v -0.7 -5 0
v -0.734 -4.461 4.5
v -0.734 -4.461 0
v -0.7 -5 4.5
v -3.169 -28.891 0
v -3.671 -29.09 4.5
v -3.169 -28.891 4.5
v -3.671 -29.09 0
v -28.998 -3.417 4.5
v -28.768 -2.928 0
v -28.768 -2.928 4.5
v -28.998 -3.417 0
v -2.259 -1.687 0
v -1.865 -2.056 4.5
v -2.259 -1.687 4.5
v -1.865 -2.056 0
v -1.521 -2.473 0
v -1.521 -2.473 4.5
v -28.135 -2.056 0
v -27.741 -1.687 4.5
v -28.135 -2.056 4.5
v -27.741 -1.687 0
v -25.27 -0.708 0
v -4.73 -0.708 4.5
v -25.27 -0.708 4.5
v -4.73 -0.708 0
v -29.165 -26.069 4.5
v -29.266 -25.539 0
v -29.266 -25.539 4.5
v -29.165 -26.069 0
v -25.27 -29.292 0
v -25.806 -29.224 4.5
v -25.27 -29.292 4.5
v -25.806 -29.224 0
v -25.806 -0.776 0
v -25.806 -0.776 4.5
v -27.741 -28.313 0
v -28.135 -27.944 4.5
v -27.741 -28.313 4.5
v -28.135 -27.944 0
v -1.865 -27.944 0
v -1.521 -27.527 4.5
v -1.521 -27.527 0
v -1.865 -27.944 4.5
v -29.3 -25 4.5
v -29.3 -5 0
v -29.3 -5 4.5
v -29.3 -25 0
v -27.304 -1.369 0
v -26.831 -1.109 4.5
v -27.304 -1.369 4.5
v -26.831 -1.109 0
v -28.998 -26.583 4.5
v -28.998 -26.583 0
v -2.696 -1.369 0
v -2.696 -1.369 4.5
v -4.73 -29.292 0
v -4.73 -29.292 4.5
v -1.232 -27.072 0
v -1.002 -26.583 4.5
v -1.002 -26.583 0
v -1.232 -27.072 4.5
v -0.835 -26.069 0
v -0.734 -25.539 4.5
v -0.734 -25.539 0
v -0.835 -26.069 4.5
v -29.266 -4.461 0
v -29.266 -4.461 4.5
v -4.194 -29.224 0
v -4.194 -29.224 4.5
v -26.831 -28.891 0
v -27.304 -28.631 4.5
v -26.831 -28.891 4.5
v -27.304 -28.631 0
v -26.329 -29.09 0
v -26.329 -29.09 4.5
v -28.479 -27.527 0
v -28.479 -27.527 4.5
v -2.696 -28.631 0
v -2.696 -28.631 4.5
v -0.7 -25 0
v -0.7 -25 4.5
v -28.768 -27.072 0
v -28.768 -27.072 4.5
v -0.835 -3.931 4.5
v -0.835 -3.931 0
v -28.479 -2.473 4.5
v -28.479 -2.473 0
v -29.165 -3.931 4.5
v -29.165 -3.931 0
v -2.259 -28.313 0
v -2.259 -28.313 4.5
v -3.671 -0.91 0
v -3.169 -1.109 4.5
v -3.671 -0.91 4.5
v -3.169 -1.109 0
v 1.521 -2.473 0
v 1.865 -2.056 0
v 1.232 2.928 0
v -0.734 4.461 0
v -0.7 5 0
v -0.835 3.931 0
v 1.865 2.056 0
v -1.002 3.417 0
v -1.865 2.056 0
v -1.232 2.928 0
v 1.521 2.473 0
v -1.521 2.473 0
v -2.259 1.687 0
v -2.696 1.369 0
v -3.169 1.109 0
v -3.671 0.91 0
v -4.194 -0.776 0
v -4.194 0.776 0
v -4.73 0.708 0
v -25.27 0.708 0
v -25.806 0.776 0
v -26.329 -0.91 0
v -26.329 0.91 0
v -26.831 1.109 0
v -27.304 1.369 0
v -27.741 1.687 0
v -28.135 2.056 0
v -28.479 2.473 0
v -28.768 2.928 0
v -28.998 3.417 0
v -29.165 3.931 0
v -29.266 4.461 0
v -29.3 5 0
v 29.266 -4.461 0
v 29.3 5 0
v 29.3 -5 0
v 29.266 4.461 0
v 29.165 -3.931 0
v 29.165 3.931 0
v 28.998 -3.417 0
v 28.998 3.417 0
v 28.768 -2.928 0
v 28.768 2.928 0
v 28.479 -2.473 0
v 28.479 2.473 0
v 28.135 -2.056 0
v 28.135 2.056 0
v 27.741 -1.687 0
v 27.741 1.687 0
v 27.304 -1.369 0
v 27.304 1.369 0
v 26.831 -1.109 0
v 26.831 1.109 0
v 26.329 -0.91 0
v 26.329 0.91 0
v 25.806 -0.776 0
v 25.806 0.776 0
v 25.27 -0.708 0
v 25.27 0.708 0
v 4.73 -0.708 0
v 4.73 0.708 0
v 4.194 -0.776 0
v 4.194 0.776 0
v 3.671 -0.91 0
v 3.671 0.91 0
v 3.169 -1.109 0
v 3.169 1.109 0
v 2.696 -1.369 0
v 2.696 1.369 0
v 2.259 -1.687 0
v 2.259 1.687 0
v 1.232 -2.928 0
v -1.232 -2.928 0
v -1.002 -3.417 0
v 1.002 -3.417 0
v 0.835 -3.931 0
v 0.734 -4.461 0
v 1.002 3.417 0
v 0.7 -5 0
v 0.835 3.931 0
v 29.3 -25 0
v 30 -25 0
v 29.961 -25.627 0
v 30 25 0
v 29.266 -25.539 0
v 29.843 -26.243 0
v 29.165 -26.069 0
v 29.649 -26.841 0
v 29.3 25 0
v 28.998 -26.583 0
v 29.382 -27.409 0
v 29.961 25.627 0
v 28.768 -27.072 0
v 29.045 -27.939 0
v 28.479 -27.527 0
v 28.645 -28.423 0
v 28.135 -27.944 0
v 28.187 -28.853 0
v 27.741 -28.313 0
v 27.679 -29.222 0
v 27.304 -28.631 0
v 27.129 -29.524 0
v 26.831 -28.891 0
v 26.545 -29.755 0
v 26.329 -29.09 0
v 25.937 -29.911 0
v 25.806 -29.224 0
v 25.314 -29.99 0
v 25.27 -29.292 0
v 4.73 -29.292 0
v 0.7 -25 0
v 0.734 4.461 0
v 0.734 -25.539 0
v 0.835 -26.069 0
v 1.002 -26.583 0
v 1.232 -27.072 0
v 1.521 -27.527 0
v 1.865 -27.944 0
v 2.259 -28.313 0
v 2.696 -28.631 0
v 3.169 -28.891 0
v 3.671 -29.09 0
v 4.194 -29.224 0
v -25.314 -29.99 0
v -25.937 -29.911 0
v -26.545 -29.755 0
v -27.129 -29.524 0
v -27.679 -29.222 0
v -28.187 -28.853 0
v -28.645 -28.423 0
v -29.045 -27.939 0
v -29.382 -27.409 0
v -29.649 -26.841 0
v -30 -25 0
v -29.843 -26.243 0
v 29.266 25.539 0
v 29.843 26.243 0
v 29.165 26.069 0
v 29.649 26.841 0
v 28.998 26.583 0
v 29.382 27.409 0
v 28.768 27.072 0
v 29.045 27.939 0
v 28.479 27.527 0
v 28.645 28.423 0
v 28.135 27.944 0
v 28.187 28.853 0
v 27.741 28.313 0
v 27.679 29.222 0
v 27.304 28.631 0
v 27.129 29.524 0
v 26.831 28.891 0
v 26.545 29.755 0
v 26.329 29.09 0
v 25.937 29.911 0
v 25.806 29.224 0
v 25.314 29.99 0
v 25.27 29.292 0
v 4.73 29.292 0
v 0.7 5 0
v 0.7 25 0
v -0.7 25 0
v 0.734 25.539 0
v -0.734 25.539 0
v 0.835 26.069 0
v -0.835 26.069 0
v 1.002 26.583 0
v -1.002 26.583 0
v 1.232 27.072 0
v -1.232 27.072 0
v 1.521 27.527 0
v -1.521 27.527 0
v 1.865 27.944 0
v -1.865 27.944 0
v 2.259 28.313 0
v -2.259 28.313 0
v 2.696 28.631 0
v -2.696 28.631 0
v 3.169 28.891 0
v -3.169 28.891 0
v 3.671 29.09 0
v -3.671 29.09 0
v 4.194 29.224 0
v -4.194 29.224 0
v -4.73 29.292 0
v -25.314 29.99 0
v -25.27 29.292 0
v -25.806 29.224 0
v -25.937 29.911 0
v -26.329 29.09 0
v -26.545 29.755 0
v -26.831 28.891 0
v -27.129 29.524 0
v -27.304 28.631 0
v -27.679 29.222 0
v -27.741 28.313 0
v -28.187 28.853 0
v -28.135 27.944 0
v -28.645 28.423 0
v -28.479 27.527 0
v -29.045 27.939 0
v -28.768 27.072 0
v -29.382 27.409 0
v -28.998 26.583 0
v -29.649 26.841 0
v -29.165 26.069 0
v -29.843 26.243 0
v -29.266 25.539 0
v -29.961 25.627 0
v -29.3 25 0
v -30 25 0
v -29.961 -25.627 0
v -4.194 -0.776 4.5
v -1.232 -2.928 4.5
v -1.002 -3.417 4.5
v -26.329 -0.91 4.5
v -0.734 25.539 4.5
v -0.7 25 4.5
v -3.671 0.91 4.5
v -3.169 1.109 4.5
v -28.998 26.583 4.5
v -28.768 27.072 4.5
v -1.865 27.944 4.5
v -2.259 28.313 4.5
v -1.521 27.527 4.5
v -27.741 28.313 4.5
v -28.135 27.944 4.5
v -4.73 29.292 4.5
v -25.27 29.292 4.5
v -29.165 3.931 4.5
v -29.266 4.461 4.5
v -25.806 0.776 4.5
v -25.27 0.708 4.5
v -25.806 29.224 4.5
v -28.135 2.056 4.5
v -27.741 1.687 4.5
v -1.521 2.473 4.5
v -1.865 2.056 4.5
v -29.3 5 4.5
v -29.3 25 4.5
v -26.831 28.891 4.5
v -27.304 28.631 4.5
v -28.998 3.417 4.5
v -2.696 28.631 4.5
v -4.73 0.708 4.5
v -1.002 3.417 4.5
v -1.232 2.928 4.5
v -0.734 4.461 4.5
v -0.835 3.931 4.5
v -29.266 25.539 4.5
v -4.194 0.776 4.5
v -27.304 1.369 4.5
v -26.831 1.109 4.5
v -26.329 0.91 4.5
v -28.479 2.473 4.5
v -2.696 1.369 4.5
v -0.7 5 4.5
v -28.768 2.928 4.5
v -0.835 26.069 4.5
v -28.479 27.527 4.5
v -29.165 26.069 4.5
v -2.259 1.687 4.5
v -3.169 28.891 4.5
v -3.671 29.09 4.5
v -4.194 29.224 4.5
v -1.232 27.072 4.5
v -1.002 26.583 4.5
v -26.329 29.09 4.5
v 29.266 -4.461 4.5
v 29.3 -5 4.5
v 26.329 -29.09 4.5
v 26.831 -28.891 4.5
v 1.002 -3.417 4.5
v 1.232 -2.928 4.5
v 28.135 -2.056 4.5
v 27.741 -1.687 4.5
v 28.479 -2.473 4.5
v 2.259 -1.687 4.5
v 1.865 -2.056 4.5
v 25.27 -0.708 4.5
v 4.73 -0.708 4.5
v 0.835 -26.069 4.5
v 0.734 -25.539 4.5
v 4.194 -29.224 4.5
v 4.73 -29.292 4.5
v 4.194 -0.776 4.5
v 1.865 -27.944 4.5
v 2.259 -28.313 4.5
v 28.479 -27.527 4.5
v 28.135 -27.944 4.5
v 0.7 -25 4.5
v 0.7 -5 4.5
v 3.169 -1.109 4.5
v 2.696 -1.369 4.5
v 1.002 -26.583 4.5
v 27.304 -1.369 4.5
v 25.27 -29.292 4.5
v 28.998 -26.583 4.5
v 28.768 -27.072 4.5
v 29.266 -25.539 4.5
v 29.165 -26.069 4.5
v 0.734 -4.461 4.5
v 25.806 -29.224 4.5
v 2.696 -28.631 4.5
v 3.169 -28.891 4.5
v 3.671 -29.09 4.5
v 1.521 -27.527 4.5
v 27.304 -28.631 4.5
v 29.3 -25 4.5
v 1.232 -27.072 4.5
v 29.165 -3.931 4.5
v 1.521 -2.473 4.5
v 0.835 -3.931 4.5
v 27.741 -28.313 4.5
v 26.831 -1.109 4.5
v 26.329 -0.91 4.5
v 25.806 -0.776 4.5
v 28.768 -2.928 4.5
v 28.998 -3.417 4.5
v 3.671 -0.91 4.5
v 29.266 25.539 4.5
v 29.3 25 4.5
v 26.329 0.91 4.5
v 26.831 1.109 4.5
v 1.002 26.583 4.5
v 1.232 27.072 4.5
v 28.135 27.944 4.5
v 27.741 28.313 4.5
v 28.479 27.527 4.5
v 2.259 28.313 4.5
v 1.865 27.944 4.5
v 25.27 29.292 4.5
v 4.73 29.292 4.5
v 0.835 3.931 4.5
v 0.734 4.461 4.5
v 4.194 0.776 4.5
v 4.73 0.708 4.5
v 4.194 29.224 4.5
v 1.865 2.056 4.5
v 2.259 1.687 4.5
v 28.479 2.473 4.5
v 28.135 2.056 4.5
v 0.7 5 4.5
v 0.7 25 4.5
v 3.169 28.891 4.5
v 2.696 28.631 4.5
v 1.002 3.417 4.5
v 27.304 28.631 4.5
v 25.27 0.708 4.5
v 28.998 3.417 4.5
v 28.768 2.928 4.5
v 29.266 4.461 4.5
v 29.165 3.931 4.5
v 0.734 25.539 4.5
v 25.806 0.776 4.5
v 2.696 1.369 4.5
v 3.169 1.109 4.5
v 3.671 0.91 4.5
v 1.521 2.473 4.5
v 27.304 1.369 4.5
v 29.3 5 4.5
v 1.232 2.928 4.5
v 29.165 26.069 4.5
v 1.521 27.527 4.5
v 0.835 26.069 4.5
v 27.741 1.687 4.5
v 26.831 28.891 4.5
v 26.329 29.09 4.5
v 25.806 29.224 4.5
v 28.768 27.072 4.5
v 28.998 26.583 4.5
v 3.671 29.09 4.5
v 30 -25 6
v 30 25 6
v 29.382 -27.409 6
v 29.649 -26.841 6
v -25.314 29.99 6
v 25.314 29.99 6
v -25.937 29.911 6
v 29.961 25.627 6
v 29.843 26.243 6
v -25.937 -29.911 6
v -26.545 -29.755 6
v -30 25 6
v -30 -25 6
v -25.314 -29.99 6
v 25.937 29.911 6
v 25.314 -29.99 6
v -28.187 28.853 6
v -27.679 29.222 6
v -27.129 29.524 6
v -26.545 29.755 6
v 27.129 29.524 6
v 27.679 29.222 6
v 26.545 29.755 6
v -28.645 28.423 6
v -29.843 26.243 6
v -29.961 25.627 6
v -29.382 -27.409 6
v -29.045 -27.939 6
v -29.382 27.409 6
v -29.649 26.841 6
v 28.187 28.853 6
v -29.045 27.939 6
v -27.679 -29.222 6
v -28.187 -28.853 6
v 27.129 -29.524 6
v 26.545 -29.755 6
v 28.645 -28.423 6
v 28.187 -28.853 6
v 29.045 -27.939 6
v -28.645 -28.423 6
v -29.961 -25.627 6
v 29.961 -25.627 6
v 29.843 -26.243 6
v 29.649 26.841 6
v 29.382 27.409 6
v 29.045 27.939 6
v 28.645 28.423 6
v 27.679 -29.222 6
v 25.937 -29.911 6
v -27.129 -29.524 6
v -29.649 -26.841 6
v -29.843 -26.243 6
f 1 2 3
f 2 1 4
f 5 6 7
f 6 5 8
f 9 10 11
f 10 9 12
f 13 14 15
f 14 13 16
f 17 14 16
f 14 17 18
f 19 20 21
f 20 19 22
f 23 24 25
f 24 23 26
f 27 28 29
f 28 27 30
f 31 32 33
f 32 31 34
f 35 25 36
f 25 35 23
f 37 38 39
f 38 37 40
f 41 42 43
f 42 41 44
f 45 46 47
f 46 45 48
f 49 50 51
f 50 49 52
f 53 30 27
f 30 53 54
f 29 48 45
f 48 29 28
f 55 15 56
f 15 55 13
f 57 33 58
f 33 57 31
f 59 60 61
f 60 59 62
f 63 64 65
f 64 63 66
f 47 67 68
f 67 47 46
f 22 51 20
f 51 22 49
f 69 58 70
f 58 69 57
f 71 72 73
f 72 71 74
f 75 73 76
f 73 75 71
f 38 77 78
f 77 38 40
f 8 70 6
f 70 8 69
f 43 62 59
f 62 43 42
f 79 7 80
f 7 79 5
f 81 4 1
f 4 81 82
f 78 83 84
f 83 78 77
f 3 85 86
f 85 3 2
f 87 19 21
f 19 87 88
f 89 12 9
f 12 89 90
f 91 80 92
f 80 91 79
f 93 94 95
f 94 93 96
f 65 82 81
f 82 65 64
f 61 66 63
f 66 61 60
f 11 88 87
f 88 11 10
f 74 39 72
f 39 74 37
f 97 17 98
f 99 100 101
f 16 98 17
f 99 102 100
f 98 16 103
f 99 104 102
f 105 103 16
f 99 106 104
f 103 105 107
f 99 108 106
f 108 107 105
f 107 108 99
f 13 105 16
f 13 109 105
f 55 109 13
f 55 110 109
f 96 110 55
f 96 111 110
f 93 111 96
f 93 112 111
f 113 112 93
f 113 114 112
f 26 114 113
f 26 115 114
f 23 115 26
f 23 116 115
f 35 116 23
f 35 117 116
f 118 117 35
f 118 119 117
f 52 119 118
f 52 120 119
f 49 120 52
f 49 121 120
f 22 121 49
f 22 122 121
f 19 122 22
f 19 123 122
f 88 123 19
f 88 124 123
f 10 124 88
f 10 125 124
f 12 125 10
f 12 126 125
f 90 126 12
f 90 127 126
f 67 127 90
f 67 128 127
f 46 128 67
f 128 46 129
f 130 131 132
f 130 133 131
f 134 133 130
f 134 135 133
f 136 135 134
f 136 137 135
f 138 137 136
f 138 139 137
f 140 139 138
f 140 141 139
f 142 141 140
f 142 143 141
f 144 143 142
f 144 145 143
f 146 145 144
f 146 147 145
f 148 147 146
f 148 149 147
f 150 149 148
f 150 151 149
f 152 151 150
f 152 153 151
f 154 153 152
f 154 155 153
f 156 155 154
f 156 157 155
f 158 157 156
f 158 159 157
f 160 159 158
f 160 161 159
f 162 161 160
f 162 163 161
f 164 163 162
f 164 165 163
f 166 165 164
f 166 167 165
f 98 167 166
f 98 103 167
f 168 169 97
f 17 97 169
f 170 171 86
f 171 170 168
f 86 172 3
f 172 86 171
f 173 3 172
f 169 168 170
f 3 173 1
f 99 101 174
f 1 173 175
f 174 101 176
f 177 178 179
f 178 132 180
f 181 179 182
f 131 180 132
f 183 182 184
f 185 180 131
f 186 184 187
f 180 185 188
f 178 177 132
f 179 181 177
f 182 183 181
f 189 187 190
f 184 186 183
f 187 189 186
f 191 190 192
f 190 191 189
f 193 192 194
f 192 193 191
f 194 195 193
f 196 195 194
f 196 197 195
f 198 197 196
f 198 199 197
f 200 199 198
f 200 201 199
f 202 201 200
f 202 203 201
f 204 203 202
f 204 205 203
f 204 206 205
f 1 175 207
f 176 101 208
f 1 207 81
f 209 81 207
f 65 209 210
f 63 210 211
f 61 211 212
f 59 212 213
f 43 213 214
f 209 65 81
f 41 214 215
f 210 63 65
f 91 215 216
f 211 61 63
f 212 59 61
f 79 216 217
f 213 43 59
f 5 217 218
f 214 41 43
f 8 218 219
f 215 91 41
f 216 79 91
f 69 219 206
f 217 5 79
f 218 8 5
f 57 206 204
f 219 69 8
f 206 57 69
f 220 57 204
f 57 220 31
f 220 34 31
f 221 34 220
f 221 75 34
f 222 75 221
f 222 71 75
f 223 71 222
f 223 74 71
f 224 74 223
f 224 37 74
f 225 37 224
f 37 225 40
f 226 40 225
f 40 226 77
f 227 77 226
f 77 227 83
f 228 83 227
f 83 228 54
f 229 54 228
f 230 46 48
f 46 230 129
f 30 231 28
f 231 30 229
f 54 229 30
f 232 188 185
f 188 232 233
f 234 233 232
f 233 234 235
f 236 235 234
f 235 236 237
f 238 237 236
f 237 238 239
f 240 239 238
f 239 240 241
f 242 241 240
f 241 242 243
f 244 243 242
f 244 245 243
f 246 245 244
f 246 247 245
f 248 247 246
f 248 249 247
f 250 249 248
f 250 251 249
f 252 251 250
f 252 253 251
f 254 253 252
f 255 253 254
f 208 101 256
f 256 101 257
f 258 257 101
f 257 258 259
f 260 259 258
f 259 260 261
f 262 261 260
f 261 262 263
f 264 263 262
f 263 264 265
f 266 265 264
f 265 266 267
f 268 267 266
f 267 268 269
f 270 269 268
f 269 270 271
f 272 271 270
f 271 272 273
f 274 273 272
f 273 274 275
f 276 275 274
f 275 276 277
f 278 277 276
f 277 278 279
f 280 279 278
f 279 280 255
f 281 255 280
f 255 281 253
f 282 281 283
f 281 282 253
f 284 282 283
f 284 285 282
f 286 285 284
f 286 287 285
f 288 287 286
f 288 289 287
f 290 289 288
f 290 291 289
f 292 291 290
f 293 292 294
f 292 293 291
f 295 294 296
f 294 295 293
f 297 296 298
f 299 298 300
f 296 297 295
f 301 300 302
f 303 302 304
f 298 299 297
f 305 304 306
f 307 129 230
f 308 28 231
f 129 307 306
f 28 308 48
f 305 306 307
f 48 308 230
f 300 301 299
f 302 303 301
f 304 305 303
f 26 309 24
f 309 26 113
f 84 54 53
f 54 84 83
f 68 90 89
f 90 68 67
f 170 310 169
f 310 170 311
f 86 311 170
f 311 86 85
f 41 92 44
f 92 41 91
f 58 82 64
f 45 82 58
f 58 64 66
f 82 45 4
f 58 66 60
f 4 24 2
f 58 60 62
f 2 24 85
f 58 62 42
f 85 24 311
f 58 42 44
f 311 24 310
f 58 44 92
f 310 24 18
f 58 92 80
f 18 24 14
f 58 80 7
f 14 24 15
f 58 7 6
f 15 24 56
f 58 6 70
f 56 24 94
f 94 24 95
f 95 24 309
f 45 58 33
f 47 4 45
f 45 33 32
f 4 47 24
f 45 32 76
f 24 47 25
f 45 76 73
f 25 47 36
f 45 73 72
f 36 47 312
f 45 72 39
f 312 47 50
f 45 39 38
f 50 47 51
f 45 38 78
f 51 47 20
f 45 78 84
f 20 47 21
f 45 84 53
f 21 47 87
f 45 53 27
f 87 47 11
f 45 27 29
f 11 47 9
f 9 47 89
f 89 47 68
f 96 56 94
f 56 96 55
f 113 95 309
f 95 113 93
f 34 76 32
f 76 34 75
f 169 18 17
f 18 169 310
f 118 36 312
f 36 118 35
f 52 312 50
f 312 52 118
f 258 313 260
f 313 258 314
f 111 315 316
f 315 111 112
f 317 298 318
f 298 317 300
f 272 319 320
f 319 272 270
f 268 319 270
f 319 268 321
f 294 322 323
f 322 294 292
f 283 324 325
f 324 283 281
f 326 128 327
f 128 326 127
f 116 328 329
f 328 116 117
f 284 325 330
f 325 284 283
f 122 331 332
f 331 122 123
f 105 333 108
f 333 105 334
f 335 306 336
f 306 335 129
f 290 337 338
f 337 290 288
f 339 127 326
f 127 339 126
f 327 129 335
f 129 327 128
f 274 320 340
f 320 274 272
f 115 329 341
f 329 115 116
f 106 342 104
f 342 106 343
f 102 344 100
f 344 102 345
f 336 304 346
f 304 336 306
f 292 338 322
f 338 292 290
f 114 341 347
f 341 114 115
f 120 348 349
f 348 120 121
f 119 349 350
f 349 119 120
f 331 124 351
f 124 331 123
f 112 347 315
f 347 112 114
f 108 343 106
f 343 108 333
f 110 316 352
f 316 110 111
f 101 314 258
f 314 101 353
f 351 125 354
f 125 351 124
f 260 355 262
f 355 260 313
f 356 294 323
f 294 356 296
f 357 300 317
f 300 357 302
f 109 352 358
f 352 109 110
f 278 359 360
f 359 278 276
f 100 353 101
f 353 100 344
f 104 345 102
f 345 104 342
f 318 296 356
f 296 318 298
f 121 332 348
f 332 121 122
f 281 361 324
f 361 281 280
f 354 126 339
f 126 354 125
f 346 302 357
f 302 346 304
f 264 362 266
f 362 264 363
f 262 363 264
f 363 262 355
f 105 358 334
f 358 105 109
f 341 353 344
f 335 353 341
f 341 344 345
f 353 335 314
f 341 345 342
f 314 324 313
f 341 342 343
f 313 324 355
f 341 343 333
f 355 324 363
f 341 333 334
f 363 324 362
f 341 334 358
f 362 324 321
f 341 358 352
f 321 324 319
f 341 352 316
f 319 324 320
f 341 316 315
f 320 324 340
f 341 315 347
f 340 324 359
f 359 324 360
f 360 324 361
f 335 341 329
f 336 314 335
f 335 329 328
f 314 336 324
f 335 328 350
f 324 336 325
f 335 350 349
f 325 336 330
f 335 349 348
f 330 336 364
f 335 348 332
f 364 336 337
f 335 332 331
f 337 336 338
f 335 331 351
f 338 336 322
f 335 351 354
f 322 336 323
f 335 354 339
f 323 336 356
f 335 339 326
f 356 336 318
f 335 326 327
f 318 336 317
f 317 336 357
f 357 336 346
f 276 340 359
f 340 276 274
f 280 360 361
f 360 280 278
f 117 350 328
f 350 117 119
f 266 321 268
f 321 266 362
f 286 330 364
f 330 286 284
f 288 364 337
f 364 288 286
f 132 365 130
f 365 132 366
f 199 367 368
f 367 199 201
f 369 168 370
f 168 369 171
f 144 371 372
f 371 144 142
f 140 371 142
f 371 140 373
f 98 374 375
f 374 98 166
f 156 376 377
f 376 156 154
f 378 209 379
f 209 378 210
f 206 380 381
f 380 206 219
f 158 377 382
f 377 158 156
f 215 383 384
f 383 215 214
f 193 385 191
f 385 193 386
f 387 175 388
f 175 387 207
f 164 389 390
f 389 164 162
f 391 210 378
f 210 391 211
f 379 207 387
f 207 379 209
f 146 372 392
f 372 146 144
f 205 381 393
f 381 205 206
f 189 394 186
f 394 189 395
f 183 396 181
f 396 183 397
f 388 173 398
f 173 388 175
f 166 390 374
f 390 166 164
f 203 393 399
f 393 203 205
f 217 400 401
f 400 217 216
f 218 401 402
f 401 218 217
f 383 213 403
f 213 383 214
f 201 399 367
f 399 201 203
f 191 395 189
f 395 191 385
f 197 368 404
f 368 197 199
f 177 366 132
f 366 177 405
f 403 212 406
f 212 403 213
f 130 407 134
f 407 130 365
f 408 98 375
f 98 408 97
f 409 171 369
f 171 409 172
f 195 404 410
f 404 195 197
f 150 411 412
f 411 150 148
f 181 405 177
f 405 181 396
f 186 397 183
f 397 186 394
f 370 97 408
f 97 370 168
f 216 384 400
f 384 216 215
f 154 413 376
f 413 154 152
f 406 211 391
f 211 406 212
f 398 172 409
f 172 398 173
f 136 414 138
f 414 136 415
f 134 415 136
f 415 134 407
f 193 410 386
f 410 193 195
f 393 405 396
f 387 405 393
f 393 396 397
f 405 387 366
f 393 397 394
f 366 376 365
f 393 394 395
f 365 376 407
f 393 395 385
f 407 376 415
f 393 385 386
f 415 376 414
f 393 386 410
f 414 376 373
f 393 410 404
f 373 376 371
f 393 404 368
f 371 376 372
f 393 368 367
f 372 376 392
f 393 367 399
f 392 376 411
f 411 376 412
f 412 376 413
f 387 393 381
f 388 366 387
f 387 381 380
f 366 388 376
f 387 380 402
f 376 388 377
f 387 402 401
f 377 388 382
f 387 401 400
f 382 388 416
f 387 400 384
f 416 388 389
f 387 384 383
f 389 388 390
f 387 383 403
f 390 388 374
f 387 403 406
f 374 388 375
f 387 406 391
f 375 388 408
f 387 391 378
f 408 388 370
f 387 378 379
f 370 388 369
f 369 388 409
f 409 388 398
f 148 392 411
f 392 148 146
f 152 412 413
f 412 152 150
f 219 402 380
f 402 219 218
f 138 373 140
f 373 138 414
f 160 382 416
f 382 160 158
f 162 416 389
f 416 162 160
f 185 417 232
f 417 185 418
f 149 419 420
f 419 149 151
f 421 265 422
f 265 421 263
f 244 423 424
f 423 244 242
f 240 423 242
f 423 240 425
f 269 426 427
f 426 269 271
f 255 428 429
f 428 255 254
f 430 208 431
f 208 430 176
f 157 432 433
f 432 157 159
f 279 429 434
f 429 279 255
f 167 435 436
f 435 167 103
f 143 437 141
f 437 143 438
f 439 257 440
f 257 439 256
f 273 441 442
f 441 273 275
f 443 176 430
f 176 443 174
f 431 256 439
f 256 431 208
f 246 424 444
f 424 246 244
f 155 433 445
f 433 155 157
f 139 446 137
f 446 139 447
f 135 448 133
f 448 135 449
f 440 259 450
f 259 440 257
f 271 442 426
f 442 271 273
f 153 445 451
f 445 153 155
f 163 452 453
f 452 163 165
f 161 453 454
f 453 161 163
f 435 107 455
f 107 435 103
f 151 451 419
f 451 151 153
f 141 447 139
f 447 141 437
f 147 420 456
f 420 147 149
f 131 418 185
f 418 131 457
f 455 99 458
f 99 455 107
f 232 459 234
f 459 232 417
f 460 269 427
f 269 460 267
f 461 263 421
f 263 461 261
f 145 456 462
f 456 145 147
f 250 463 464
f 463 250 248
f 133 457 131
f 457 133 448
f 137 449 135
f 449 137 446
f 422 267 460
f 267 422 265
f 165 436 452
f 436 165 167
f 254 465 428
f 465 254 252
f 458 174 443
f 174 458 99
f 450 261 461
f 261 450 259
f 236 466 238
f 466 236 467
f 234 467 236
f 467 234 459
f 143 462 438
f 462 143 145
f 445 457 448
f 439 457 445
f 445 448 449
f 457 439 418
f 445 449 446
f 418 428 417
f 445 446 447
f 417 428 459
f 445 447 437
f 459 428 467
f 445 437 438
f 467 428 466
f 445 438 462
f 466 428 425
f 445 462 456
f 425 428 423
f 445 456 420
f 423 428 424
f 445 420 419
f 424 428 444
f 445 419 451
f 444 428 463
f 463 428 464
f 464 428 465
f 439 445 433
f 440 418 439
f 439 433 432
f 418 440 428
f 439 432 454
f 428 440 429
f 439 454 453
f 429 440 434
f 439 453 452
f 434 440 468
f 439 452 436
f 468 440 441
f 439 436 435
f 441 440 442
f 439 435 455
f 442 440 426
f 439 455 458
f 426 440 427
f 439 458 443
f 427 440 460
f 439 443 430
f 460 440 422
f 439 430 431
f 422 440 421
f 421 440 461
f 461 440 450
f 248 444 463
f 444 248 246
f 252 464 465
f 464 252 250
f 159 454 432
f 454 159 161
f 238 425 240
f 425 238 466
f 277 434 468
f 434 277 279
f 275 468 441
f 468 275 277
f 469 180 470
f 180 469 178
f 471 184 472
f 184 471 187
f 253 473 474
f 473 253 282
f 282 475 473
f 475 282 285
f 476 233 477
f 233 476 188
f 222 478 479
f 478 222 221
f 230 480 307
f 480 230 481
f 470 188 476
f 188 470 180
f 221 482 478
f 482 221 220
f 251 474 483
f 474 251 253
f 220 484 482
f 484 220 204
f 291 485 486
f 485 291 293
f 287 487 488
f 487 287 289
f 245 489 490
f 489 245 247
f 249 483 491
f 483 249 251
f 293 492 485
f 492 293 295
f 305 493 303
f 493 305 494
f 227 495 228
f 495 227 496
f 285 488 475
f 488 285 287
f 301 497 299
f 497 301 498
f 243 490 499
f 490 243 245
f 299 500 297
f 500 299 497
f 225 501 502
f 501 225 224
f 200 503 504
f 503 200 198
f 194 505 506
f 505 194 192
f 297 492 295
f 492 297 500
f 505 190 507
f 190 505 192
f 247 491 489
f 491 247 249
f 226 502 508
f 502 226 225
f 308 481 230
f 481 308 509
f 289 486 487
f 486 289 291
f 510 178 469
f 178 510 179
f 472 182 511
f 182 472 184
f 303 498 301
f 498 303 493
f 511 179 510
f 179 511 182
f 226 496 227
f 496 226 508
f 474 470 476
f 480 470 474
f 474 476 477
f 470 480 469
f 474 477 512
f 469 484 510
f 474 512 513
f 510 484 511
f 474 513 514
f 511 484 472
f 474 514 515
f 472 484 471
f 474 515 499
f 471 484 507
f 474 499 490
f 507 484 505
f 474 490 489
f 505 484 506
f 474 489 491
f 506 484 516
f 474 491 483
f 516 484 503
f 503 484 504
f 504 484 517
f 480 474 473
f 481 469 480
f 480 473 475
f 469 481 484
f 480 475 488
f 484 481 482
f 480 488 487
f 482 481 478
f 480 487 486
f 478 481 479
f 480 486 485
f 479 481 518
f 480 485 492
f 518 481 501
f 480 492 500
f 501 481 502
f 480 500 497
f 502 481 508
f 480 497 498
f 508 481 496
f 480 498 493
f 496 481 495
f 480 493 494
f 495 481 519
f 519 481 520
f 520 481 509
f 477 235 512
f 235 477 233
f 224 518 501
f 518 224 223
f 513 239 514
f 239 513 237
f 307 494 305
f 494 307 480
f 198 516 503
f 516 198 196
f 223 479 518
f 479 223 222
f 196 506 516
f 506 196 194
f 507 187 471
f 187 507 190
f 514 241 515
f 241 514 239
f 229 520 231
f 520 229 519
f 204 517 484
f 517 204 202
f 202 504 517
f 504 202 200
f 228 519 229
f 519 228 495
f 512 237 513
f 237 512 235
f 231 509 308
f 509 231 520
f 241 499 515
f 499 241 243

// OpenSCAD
$fn = 50;


difference() {
	union() {
		hull() {
			translate(v = [-25.0000000000, 25.0000000000, 0]) {
				cylinder(h = 6, r = 5);
			}
			translate(v = [25.0000000000, 25.0000000000, 0]) {
				cylinder(h = 6, r = 5);
			}
			translate(v = [-25.0000000000, -25.0000000000, 0]) {
				cylinder(h = 6, r = 5);
			}
			translate(v = [25.0000000000, -25.0000000000, 0]) {
				cylinder(h = 6, r = 5);
			}
		}
	}
	union() {
		translate(v = [-15.0000000000, -15.0000000000, 0]) {
			hull() {
				translate(v = [-10.0000000000, 10.0000000000, 0]) {
					cylinder(h = 4.5000000000, r = 4.3000000000);
				}
				translate(v = [10.0000000000, 10.0000000000, 0]) {
					cylinder(h = 4.5000000000, r = 4.3000000000);
				}
				translate(v = [-10.0000000000, -10.0000000000, 0]) {
					cylinder(h = 4.5000000000, r = 4.3000000000);
				}
				translate(v = [10.0000000000, -10.0000000000, 0]) {
					cylinder(h = 4.5000000000, r = 4.3000000000);
				}
			}
		}
		translate(v = [-15.0000000000, 15.0000000000, 0]) {
			hull() {
				translate(v = [-10.0000000000, 10.0000000000, 0]) {
					cylinder(h = 4.5000000000, r = 4.3000000000);
				}
				translate(v = [10.0000000000, 10.0000000000, 0]) {
					cylinder(h = 4.5000000000, r = 4.3000000000);
				}
				translate(v = [-10.0000000000, -10.0000000000, 0]) {
					cylinder(h = 4.5000000000, r = 4.3000000000);
				}
				translate(v = [10.0000000000, -10.0000000000, 0]) {
					cylinder(h = 4.5000000000, r = 4.3000000000);
				}
			}
		}
		translate(v = [15.0000000000, -15.0000000000, 0]) {
			hull() {
				translate(v = [-10.0000000000, 10.0000000000, 0]) {
					cylinder(h = 4.5000000000, r = 4.3000000000);
				}
				translate(v = [10.0000000000, 10.0000000000, 0]) {
					cylinder(h = 4.5000000000, r = 4.3000000000);
				}
				translate(v = [-10.0000000000, -10.0000000000, 0]) {
					cylinder(h = 4.5000000000, r = 4.3000000000);
				}
				translate(v = [10.0000000000, -10.0000000000, 0]) {
					cylinder(h = 4.5000000000, r = 4.3000000000);
				}
			}
		}
		translate(v = [15.0000000000, 15.0000000000, 0]) {
			hull() {
				translate(v = [-10.0000000000, 10.0000000000, 0]) {
					cylinder(h = 4.5000000000, r = 4.3000000000);
				}
				translate(v = [10.0000000000, 10.0000000000, 0]) {
					cylinder(h = 4.5000000000, r = 4.3000000000);
				}
				translate(v = [-10.0000000000, -10.0000000000, 0]) {
					cylinder(h = 4.5000000000, r = 4.3000000000);
				}
				translate(v = [10.0000000000, -10.0000000000, 0]) {
					cylinder(h = 4.5000000000, r = 4.3000000000);
				}
			}
		}
	}
}
